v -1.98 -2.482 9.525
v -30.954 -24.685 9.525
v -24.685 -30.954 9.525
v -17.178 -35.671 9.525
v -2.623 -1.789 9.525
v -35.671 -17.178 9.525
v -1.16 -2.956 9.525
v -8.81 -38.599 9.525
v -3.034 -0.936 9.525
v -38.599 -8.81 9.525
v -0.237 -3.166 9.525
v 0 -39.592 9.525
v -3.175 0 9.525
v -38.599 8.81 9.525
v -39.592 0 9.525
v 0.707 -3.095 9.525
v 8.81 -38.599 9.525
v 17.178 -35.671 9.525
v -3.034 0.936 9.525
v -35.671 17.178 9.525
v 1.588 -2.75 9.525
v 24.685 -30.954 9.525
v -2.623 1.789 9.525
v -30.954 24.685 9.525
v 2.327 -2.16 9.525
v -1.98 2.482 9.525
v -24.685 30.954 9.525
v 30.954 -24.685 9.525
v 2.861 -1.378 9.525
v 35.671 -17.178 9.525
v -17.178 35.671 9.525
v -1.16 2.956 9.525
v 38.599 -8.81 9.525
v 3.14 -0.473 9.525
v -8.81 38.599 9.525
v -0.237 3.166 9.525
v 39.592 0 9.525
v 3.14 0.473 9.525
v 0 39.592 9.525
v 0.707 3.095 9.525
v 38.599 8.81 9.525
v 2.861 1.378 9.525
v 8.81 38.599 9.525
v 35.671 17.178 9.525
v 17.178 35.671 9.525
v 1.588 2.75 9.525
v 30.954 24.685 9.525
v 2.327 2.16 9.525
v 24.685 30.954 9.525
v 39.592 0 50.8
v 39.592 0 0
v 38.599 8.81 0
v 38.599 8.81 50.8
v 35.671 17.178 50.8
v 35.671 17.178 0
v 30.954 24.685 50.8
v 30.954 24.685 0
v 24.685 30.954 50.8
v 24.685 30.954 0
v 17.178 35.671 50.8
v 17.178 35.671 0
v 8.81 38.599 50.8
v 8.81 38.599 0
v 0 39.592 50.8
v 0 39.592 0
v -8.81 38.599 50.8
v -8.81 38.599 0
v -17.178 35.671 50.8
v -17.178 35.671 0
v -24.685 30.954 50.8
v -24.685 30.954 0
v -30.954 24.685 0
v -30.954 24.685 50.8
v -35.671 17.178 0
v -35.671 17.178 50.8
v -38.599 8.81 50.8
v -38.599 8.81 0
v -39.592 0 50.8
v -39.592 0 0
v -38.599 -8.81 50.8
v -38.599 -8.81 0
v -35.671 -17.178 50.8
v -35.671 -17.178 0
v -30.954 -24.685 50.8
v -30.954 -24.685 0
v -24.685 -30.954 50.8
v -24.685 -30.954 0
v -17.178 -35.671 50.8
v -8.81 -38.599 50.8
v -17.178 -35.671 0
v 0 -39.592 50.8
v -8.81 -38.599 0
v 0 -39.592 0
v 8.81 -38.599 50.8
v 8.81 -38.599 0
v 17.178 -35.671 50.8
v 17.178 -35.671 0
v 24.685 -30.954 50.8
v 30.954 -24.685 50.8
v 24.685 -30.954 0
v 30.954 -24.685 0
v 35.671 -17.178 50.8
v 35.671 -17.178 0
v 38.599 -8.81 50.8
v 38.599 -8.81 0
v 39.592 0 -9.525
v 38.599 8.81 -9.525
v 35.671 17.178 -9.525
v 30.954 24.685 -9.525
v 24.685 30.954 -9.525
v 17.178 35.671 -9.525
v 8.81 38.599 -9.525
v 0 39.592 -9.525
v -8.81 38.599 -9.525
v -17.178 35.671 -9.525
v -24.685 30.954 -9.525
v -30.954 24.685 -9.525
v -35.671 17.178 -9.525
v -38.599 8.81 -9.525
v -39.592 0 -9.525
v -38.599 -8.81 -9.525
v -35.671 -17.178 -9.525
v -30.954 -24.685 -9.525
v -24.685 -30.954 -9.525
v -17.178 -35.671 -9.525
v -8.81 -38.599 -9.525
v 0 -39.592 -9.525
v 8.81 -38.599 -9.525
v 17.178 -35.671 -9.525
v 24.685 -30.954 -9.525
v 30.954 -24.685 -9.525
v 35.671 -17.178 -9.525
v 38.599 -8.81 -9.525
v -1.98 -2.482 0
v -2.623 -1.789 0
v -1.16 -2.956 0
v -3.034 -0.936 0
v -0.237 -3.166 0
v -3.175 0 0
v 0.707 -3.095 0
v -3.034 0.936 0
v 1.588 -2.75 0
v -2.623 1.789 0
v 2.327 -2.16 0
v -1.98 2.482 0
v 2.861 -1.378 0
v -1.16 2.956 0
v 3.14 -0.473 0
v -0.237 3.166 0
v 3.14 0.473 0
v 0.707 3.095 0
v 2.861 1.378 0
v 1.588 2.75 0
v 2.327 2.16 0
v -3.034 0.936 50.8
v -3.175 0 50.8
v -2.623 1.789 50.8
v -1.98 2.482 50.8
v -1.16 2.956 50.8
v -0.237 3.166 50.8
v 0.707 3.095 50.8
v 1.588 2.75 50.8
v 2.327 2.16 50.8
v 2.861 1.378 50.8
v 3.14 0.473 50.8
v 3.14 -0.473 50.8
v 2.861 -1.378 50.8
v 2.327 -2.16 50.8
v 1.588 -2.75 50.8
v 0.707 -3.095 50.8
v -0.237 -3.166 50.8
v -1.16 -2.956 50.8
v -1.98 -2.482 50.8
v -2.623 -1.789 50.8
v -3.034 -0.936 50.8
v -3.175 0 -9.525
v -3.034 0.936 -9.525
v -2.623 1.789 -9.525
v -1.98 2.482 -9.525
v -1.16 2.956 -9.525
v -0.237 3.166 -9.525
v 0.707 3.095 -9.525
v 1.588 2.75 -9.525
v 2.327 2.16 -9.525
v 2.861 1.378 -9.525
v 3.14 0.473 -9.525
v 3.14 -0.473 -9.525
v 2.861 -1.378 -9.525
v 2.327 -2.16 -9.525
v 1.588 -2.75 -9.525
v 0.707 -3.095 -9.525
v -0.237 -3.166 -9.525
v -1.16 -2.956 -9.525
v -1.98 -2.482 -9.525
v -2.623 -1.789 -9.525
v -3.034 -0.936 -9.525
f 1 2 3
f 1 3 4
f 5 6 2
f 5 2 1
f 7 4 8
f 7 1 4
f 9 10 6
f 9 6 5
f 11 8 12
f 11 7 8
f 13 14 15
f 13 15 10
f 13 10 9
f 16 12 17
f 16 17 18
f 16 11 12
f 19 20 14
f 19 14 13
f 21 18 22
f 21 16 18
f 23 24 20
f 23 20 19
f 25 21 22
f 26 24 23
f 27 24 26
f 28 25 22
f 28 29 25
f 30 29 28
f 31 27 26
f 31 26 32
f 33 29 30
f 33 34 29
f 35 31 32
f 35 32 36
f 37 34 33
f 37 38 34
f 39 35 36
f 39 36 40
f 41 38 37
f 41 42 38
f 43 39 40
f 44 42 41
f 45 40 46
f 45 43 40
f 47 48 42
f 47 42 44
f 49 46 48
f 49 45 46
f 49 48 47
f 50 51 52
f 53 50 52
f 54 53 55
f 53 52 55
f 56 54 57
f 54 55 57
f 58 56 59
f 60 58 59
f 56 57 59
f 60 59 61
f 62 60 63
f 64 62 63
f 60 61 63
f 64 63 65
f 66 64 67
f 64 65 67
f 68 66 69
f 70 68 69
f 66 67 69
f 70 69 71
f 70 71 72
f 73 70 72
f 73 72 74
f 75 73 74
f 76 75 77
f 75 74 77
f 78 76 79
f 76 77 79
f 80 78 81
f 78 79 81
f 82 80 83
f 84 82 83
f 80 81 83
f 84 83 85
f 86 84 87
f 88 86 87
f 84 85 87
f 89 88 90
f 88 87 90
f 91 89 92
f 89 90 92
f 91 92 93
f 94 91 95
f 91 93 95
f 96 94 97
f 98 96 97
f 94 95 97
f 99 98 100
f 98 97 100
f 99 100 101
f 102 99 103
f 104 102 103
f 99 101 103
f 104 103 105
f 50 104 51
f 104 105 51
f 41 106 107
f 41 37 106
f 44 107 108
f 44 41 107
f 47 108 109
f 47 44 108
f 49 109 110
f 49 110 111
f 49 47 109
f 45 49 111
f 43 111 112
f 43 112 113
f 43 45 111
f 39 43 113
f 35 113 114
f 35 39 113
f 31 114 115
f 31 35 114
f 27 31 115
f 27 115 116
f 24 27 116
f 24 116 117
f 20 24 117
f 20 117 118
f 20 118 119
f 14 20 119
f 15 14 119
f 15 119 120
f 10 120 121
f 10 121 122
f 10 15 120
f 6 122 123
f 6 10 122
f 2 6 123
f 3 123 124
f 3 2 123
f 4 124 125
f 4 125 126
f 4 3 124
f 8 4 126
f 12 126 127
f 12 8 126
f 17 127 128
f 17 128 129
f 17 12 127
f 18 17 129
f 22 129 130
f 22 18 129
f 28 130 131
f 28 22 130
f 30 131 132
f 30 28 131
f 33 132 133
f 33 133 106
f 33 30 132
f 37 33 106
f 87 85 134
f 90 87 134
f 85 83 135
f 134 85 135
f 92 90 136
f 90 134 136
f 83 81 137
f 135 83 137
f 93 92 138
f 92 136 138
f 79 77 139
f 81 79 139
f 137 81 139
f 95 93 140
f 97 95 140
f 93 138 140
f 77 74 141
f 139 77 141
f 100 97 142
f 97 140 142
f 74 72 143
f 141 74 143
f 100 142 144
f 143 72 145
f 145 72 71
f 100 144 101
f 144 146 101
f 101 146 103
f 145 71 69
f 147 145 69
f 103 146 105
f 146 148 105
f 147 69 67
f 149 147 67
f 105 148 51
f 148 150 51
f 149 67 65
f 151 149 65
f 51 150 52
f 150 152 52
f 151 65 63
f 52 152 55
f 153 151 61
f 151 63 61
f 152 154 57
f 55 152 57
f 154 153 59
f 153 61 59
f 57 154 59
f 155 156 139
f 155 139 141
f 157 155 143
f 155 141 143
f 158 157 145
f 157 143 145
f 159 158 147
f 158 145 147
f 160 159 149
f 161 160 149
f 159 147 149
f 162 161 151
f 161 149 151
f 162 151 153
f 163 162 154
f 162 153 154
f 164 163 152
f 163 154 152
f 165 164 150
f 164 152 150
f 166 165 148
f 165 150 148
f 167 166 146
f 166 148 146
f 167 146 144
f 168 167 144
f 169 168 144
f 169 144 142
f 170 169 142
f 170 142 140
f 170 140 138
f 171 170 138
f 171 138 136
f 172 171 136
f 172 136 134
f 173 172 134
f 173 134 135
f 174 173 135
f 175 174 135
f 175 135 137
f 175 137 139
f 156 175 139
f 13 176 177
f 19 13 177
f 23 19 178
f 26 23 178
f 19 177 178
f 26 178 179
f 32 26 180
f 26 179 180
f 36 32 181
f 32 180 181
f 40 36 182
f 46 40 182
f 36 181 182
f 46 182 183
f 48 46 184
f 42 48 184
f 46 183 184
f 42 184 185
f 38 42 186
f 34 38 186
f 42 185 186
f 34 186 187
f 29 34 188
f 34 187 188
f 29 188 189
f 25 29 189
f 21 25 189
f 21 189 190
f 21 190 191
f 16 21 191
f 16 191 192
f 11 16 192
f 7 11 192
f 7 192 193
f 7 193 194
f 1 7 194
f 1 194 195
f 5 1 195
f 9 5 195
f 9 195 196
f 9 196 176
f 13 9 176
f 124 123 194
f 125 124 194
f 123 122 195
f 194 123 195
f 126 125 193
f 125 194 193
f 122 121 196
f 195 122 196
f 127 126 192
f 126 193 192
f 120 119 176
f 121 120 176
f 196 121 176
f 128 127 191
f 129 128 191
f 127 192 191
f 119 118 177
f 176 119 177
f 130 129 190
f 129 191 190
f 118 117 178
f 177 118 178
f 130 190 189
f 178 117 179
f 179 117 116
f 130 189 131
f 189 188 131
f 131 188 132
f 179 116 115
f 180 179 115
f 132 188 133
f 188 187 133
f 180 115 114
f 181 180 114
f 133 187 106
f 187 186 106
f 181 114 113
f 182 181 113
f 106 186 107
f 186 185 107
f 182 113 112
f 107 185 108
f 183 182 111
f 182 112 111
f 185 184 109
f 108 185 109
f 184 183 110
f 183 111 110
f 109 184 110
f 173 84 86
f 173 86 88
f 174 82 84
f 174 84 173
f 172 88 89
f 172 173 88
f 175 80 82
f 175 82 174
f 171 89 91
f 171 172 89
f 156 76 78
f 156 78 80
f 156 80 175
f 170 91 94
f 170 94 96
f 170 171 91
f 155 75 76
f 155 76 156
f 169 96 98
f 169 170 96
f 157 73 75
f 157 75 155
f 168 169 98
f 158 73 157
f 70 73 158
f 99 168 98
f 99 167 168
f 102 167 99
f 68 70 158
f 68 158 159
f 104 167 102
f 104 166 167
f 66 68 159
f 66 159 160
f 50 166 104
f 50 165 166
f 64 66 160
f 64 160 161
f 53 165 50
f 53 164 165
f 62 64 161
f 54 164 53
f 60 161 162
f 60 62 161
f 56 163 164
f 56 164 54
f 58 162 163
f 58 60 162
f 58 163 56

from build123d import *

# Parameters (mm, degrees)
F0_R     = 39.5915357934
F1_DEPTH = 9.525
F2_DEPTH = 50.8
F4_D     = 6.35
F4_2_D   = 6.35


# Not quite as in the source:
# - a feature names something its author has since deleted; it is built from what else it names


with BuildPart() as f1:
    # F0 (on Top) → F1 (new body, symmetric)
    with BuildSketch(Plane.XY):
        Circle(F0_R)
    extrude(amount=F1_DEPTH, both=True)

    # F4 (through all)
    with Locations(Plane.XY.offset(50.8)):
        with Locations((0, 0)):
            Hole(F4_D / 2)


with BuildPart() as f2:
    # F0 (on Top) → F2 (new body)
    with BuildSketch(Plane.XY):
        Circle(F0_R)
    extrude(amount=F2_DEPTH)

    # F4#2 (through all)
    with Locations(Plane.XY.offset(50.8)):
        with Locations((0, 0)):
            Hole(F4_2_D / 2)


solid = Compound([f1.part, f2.part])
